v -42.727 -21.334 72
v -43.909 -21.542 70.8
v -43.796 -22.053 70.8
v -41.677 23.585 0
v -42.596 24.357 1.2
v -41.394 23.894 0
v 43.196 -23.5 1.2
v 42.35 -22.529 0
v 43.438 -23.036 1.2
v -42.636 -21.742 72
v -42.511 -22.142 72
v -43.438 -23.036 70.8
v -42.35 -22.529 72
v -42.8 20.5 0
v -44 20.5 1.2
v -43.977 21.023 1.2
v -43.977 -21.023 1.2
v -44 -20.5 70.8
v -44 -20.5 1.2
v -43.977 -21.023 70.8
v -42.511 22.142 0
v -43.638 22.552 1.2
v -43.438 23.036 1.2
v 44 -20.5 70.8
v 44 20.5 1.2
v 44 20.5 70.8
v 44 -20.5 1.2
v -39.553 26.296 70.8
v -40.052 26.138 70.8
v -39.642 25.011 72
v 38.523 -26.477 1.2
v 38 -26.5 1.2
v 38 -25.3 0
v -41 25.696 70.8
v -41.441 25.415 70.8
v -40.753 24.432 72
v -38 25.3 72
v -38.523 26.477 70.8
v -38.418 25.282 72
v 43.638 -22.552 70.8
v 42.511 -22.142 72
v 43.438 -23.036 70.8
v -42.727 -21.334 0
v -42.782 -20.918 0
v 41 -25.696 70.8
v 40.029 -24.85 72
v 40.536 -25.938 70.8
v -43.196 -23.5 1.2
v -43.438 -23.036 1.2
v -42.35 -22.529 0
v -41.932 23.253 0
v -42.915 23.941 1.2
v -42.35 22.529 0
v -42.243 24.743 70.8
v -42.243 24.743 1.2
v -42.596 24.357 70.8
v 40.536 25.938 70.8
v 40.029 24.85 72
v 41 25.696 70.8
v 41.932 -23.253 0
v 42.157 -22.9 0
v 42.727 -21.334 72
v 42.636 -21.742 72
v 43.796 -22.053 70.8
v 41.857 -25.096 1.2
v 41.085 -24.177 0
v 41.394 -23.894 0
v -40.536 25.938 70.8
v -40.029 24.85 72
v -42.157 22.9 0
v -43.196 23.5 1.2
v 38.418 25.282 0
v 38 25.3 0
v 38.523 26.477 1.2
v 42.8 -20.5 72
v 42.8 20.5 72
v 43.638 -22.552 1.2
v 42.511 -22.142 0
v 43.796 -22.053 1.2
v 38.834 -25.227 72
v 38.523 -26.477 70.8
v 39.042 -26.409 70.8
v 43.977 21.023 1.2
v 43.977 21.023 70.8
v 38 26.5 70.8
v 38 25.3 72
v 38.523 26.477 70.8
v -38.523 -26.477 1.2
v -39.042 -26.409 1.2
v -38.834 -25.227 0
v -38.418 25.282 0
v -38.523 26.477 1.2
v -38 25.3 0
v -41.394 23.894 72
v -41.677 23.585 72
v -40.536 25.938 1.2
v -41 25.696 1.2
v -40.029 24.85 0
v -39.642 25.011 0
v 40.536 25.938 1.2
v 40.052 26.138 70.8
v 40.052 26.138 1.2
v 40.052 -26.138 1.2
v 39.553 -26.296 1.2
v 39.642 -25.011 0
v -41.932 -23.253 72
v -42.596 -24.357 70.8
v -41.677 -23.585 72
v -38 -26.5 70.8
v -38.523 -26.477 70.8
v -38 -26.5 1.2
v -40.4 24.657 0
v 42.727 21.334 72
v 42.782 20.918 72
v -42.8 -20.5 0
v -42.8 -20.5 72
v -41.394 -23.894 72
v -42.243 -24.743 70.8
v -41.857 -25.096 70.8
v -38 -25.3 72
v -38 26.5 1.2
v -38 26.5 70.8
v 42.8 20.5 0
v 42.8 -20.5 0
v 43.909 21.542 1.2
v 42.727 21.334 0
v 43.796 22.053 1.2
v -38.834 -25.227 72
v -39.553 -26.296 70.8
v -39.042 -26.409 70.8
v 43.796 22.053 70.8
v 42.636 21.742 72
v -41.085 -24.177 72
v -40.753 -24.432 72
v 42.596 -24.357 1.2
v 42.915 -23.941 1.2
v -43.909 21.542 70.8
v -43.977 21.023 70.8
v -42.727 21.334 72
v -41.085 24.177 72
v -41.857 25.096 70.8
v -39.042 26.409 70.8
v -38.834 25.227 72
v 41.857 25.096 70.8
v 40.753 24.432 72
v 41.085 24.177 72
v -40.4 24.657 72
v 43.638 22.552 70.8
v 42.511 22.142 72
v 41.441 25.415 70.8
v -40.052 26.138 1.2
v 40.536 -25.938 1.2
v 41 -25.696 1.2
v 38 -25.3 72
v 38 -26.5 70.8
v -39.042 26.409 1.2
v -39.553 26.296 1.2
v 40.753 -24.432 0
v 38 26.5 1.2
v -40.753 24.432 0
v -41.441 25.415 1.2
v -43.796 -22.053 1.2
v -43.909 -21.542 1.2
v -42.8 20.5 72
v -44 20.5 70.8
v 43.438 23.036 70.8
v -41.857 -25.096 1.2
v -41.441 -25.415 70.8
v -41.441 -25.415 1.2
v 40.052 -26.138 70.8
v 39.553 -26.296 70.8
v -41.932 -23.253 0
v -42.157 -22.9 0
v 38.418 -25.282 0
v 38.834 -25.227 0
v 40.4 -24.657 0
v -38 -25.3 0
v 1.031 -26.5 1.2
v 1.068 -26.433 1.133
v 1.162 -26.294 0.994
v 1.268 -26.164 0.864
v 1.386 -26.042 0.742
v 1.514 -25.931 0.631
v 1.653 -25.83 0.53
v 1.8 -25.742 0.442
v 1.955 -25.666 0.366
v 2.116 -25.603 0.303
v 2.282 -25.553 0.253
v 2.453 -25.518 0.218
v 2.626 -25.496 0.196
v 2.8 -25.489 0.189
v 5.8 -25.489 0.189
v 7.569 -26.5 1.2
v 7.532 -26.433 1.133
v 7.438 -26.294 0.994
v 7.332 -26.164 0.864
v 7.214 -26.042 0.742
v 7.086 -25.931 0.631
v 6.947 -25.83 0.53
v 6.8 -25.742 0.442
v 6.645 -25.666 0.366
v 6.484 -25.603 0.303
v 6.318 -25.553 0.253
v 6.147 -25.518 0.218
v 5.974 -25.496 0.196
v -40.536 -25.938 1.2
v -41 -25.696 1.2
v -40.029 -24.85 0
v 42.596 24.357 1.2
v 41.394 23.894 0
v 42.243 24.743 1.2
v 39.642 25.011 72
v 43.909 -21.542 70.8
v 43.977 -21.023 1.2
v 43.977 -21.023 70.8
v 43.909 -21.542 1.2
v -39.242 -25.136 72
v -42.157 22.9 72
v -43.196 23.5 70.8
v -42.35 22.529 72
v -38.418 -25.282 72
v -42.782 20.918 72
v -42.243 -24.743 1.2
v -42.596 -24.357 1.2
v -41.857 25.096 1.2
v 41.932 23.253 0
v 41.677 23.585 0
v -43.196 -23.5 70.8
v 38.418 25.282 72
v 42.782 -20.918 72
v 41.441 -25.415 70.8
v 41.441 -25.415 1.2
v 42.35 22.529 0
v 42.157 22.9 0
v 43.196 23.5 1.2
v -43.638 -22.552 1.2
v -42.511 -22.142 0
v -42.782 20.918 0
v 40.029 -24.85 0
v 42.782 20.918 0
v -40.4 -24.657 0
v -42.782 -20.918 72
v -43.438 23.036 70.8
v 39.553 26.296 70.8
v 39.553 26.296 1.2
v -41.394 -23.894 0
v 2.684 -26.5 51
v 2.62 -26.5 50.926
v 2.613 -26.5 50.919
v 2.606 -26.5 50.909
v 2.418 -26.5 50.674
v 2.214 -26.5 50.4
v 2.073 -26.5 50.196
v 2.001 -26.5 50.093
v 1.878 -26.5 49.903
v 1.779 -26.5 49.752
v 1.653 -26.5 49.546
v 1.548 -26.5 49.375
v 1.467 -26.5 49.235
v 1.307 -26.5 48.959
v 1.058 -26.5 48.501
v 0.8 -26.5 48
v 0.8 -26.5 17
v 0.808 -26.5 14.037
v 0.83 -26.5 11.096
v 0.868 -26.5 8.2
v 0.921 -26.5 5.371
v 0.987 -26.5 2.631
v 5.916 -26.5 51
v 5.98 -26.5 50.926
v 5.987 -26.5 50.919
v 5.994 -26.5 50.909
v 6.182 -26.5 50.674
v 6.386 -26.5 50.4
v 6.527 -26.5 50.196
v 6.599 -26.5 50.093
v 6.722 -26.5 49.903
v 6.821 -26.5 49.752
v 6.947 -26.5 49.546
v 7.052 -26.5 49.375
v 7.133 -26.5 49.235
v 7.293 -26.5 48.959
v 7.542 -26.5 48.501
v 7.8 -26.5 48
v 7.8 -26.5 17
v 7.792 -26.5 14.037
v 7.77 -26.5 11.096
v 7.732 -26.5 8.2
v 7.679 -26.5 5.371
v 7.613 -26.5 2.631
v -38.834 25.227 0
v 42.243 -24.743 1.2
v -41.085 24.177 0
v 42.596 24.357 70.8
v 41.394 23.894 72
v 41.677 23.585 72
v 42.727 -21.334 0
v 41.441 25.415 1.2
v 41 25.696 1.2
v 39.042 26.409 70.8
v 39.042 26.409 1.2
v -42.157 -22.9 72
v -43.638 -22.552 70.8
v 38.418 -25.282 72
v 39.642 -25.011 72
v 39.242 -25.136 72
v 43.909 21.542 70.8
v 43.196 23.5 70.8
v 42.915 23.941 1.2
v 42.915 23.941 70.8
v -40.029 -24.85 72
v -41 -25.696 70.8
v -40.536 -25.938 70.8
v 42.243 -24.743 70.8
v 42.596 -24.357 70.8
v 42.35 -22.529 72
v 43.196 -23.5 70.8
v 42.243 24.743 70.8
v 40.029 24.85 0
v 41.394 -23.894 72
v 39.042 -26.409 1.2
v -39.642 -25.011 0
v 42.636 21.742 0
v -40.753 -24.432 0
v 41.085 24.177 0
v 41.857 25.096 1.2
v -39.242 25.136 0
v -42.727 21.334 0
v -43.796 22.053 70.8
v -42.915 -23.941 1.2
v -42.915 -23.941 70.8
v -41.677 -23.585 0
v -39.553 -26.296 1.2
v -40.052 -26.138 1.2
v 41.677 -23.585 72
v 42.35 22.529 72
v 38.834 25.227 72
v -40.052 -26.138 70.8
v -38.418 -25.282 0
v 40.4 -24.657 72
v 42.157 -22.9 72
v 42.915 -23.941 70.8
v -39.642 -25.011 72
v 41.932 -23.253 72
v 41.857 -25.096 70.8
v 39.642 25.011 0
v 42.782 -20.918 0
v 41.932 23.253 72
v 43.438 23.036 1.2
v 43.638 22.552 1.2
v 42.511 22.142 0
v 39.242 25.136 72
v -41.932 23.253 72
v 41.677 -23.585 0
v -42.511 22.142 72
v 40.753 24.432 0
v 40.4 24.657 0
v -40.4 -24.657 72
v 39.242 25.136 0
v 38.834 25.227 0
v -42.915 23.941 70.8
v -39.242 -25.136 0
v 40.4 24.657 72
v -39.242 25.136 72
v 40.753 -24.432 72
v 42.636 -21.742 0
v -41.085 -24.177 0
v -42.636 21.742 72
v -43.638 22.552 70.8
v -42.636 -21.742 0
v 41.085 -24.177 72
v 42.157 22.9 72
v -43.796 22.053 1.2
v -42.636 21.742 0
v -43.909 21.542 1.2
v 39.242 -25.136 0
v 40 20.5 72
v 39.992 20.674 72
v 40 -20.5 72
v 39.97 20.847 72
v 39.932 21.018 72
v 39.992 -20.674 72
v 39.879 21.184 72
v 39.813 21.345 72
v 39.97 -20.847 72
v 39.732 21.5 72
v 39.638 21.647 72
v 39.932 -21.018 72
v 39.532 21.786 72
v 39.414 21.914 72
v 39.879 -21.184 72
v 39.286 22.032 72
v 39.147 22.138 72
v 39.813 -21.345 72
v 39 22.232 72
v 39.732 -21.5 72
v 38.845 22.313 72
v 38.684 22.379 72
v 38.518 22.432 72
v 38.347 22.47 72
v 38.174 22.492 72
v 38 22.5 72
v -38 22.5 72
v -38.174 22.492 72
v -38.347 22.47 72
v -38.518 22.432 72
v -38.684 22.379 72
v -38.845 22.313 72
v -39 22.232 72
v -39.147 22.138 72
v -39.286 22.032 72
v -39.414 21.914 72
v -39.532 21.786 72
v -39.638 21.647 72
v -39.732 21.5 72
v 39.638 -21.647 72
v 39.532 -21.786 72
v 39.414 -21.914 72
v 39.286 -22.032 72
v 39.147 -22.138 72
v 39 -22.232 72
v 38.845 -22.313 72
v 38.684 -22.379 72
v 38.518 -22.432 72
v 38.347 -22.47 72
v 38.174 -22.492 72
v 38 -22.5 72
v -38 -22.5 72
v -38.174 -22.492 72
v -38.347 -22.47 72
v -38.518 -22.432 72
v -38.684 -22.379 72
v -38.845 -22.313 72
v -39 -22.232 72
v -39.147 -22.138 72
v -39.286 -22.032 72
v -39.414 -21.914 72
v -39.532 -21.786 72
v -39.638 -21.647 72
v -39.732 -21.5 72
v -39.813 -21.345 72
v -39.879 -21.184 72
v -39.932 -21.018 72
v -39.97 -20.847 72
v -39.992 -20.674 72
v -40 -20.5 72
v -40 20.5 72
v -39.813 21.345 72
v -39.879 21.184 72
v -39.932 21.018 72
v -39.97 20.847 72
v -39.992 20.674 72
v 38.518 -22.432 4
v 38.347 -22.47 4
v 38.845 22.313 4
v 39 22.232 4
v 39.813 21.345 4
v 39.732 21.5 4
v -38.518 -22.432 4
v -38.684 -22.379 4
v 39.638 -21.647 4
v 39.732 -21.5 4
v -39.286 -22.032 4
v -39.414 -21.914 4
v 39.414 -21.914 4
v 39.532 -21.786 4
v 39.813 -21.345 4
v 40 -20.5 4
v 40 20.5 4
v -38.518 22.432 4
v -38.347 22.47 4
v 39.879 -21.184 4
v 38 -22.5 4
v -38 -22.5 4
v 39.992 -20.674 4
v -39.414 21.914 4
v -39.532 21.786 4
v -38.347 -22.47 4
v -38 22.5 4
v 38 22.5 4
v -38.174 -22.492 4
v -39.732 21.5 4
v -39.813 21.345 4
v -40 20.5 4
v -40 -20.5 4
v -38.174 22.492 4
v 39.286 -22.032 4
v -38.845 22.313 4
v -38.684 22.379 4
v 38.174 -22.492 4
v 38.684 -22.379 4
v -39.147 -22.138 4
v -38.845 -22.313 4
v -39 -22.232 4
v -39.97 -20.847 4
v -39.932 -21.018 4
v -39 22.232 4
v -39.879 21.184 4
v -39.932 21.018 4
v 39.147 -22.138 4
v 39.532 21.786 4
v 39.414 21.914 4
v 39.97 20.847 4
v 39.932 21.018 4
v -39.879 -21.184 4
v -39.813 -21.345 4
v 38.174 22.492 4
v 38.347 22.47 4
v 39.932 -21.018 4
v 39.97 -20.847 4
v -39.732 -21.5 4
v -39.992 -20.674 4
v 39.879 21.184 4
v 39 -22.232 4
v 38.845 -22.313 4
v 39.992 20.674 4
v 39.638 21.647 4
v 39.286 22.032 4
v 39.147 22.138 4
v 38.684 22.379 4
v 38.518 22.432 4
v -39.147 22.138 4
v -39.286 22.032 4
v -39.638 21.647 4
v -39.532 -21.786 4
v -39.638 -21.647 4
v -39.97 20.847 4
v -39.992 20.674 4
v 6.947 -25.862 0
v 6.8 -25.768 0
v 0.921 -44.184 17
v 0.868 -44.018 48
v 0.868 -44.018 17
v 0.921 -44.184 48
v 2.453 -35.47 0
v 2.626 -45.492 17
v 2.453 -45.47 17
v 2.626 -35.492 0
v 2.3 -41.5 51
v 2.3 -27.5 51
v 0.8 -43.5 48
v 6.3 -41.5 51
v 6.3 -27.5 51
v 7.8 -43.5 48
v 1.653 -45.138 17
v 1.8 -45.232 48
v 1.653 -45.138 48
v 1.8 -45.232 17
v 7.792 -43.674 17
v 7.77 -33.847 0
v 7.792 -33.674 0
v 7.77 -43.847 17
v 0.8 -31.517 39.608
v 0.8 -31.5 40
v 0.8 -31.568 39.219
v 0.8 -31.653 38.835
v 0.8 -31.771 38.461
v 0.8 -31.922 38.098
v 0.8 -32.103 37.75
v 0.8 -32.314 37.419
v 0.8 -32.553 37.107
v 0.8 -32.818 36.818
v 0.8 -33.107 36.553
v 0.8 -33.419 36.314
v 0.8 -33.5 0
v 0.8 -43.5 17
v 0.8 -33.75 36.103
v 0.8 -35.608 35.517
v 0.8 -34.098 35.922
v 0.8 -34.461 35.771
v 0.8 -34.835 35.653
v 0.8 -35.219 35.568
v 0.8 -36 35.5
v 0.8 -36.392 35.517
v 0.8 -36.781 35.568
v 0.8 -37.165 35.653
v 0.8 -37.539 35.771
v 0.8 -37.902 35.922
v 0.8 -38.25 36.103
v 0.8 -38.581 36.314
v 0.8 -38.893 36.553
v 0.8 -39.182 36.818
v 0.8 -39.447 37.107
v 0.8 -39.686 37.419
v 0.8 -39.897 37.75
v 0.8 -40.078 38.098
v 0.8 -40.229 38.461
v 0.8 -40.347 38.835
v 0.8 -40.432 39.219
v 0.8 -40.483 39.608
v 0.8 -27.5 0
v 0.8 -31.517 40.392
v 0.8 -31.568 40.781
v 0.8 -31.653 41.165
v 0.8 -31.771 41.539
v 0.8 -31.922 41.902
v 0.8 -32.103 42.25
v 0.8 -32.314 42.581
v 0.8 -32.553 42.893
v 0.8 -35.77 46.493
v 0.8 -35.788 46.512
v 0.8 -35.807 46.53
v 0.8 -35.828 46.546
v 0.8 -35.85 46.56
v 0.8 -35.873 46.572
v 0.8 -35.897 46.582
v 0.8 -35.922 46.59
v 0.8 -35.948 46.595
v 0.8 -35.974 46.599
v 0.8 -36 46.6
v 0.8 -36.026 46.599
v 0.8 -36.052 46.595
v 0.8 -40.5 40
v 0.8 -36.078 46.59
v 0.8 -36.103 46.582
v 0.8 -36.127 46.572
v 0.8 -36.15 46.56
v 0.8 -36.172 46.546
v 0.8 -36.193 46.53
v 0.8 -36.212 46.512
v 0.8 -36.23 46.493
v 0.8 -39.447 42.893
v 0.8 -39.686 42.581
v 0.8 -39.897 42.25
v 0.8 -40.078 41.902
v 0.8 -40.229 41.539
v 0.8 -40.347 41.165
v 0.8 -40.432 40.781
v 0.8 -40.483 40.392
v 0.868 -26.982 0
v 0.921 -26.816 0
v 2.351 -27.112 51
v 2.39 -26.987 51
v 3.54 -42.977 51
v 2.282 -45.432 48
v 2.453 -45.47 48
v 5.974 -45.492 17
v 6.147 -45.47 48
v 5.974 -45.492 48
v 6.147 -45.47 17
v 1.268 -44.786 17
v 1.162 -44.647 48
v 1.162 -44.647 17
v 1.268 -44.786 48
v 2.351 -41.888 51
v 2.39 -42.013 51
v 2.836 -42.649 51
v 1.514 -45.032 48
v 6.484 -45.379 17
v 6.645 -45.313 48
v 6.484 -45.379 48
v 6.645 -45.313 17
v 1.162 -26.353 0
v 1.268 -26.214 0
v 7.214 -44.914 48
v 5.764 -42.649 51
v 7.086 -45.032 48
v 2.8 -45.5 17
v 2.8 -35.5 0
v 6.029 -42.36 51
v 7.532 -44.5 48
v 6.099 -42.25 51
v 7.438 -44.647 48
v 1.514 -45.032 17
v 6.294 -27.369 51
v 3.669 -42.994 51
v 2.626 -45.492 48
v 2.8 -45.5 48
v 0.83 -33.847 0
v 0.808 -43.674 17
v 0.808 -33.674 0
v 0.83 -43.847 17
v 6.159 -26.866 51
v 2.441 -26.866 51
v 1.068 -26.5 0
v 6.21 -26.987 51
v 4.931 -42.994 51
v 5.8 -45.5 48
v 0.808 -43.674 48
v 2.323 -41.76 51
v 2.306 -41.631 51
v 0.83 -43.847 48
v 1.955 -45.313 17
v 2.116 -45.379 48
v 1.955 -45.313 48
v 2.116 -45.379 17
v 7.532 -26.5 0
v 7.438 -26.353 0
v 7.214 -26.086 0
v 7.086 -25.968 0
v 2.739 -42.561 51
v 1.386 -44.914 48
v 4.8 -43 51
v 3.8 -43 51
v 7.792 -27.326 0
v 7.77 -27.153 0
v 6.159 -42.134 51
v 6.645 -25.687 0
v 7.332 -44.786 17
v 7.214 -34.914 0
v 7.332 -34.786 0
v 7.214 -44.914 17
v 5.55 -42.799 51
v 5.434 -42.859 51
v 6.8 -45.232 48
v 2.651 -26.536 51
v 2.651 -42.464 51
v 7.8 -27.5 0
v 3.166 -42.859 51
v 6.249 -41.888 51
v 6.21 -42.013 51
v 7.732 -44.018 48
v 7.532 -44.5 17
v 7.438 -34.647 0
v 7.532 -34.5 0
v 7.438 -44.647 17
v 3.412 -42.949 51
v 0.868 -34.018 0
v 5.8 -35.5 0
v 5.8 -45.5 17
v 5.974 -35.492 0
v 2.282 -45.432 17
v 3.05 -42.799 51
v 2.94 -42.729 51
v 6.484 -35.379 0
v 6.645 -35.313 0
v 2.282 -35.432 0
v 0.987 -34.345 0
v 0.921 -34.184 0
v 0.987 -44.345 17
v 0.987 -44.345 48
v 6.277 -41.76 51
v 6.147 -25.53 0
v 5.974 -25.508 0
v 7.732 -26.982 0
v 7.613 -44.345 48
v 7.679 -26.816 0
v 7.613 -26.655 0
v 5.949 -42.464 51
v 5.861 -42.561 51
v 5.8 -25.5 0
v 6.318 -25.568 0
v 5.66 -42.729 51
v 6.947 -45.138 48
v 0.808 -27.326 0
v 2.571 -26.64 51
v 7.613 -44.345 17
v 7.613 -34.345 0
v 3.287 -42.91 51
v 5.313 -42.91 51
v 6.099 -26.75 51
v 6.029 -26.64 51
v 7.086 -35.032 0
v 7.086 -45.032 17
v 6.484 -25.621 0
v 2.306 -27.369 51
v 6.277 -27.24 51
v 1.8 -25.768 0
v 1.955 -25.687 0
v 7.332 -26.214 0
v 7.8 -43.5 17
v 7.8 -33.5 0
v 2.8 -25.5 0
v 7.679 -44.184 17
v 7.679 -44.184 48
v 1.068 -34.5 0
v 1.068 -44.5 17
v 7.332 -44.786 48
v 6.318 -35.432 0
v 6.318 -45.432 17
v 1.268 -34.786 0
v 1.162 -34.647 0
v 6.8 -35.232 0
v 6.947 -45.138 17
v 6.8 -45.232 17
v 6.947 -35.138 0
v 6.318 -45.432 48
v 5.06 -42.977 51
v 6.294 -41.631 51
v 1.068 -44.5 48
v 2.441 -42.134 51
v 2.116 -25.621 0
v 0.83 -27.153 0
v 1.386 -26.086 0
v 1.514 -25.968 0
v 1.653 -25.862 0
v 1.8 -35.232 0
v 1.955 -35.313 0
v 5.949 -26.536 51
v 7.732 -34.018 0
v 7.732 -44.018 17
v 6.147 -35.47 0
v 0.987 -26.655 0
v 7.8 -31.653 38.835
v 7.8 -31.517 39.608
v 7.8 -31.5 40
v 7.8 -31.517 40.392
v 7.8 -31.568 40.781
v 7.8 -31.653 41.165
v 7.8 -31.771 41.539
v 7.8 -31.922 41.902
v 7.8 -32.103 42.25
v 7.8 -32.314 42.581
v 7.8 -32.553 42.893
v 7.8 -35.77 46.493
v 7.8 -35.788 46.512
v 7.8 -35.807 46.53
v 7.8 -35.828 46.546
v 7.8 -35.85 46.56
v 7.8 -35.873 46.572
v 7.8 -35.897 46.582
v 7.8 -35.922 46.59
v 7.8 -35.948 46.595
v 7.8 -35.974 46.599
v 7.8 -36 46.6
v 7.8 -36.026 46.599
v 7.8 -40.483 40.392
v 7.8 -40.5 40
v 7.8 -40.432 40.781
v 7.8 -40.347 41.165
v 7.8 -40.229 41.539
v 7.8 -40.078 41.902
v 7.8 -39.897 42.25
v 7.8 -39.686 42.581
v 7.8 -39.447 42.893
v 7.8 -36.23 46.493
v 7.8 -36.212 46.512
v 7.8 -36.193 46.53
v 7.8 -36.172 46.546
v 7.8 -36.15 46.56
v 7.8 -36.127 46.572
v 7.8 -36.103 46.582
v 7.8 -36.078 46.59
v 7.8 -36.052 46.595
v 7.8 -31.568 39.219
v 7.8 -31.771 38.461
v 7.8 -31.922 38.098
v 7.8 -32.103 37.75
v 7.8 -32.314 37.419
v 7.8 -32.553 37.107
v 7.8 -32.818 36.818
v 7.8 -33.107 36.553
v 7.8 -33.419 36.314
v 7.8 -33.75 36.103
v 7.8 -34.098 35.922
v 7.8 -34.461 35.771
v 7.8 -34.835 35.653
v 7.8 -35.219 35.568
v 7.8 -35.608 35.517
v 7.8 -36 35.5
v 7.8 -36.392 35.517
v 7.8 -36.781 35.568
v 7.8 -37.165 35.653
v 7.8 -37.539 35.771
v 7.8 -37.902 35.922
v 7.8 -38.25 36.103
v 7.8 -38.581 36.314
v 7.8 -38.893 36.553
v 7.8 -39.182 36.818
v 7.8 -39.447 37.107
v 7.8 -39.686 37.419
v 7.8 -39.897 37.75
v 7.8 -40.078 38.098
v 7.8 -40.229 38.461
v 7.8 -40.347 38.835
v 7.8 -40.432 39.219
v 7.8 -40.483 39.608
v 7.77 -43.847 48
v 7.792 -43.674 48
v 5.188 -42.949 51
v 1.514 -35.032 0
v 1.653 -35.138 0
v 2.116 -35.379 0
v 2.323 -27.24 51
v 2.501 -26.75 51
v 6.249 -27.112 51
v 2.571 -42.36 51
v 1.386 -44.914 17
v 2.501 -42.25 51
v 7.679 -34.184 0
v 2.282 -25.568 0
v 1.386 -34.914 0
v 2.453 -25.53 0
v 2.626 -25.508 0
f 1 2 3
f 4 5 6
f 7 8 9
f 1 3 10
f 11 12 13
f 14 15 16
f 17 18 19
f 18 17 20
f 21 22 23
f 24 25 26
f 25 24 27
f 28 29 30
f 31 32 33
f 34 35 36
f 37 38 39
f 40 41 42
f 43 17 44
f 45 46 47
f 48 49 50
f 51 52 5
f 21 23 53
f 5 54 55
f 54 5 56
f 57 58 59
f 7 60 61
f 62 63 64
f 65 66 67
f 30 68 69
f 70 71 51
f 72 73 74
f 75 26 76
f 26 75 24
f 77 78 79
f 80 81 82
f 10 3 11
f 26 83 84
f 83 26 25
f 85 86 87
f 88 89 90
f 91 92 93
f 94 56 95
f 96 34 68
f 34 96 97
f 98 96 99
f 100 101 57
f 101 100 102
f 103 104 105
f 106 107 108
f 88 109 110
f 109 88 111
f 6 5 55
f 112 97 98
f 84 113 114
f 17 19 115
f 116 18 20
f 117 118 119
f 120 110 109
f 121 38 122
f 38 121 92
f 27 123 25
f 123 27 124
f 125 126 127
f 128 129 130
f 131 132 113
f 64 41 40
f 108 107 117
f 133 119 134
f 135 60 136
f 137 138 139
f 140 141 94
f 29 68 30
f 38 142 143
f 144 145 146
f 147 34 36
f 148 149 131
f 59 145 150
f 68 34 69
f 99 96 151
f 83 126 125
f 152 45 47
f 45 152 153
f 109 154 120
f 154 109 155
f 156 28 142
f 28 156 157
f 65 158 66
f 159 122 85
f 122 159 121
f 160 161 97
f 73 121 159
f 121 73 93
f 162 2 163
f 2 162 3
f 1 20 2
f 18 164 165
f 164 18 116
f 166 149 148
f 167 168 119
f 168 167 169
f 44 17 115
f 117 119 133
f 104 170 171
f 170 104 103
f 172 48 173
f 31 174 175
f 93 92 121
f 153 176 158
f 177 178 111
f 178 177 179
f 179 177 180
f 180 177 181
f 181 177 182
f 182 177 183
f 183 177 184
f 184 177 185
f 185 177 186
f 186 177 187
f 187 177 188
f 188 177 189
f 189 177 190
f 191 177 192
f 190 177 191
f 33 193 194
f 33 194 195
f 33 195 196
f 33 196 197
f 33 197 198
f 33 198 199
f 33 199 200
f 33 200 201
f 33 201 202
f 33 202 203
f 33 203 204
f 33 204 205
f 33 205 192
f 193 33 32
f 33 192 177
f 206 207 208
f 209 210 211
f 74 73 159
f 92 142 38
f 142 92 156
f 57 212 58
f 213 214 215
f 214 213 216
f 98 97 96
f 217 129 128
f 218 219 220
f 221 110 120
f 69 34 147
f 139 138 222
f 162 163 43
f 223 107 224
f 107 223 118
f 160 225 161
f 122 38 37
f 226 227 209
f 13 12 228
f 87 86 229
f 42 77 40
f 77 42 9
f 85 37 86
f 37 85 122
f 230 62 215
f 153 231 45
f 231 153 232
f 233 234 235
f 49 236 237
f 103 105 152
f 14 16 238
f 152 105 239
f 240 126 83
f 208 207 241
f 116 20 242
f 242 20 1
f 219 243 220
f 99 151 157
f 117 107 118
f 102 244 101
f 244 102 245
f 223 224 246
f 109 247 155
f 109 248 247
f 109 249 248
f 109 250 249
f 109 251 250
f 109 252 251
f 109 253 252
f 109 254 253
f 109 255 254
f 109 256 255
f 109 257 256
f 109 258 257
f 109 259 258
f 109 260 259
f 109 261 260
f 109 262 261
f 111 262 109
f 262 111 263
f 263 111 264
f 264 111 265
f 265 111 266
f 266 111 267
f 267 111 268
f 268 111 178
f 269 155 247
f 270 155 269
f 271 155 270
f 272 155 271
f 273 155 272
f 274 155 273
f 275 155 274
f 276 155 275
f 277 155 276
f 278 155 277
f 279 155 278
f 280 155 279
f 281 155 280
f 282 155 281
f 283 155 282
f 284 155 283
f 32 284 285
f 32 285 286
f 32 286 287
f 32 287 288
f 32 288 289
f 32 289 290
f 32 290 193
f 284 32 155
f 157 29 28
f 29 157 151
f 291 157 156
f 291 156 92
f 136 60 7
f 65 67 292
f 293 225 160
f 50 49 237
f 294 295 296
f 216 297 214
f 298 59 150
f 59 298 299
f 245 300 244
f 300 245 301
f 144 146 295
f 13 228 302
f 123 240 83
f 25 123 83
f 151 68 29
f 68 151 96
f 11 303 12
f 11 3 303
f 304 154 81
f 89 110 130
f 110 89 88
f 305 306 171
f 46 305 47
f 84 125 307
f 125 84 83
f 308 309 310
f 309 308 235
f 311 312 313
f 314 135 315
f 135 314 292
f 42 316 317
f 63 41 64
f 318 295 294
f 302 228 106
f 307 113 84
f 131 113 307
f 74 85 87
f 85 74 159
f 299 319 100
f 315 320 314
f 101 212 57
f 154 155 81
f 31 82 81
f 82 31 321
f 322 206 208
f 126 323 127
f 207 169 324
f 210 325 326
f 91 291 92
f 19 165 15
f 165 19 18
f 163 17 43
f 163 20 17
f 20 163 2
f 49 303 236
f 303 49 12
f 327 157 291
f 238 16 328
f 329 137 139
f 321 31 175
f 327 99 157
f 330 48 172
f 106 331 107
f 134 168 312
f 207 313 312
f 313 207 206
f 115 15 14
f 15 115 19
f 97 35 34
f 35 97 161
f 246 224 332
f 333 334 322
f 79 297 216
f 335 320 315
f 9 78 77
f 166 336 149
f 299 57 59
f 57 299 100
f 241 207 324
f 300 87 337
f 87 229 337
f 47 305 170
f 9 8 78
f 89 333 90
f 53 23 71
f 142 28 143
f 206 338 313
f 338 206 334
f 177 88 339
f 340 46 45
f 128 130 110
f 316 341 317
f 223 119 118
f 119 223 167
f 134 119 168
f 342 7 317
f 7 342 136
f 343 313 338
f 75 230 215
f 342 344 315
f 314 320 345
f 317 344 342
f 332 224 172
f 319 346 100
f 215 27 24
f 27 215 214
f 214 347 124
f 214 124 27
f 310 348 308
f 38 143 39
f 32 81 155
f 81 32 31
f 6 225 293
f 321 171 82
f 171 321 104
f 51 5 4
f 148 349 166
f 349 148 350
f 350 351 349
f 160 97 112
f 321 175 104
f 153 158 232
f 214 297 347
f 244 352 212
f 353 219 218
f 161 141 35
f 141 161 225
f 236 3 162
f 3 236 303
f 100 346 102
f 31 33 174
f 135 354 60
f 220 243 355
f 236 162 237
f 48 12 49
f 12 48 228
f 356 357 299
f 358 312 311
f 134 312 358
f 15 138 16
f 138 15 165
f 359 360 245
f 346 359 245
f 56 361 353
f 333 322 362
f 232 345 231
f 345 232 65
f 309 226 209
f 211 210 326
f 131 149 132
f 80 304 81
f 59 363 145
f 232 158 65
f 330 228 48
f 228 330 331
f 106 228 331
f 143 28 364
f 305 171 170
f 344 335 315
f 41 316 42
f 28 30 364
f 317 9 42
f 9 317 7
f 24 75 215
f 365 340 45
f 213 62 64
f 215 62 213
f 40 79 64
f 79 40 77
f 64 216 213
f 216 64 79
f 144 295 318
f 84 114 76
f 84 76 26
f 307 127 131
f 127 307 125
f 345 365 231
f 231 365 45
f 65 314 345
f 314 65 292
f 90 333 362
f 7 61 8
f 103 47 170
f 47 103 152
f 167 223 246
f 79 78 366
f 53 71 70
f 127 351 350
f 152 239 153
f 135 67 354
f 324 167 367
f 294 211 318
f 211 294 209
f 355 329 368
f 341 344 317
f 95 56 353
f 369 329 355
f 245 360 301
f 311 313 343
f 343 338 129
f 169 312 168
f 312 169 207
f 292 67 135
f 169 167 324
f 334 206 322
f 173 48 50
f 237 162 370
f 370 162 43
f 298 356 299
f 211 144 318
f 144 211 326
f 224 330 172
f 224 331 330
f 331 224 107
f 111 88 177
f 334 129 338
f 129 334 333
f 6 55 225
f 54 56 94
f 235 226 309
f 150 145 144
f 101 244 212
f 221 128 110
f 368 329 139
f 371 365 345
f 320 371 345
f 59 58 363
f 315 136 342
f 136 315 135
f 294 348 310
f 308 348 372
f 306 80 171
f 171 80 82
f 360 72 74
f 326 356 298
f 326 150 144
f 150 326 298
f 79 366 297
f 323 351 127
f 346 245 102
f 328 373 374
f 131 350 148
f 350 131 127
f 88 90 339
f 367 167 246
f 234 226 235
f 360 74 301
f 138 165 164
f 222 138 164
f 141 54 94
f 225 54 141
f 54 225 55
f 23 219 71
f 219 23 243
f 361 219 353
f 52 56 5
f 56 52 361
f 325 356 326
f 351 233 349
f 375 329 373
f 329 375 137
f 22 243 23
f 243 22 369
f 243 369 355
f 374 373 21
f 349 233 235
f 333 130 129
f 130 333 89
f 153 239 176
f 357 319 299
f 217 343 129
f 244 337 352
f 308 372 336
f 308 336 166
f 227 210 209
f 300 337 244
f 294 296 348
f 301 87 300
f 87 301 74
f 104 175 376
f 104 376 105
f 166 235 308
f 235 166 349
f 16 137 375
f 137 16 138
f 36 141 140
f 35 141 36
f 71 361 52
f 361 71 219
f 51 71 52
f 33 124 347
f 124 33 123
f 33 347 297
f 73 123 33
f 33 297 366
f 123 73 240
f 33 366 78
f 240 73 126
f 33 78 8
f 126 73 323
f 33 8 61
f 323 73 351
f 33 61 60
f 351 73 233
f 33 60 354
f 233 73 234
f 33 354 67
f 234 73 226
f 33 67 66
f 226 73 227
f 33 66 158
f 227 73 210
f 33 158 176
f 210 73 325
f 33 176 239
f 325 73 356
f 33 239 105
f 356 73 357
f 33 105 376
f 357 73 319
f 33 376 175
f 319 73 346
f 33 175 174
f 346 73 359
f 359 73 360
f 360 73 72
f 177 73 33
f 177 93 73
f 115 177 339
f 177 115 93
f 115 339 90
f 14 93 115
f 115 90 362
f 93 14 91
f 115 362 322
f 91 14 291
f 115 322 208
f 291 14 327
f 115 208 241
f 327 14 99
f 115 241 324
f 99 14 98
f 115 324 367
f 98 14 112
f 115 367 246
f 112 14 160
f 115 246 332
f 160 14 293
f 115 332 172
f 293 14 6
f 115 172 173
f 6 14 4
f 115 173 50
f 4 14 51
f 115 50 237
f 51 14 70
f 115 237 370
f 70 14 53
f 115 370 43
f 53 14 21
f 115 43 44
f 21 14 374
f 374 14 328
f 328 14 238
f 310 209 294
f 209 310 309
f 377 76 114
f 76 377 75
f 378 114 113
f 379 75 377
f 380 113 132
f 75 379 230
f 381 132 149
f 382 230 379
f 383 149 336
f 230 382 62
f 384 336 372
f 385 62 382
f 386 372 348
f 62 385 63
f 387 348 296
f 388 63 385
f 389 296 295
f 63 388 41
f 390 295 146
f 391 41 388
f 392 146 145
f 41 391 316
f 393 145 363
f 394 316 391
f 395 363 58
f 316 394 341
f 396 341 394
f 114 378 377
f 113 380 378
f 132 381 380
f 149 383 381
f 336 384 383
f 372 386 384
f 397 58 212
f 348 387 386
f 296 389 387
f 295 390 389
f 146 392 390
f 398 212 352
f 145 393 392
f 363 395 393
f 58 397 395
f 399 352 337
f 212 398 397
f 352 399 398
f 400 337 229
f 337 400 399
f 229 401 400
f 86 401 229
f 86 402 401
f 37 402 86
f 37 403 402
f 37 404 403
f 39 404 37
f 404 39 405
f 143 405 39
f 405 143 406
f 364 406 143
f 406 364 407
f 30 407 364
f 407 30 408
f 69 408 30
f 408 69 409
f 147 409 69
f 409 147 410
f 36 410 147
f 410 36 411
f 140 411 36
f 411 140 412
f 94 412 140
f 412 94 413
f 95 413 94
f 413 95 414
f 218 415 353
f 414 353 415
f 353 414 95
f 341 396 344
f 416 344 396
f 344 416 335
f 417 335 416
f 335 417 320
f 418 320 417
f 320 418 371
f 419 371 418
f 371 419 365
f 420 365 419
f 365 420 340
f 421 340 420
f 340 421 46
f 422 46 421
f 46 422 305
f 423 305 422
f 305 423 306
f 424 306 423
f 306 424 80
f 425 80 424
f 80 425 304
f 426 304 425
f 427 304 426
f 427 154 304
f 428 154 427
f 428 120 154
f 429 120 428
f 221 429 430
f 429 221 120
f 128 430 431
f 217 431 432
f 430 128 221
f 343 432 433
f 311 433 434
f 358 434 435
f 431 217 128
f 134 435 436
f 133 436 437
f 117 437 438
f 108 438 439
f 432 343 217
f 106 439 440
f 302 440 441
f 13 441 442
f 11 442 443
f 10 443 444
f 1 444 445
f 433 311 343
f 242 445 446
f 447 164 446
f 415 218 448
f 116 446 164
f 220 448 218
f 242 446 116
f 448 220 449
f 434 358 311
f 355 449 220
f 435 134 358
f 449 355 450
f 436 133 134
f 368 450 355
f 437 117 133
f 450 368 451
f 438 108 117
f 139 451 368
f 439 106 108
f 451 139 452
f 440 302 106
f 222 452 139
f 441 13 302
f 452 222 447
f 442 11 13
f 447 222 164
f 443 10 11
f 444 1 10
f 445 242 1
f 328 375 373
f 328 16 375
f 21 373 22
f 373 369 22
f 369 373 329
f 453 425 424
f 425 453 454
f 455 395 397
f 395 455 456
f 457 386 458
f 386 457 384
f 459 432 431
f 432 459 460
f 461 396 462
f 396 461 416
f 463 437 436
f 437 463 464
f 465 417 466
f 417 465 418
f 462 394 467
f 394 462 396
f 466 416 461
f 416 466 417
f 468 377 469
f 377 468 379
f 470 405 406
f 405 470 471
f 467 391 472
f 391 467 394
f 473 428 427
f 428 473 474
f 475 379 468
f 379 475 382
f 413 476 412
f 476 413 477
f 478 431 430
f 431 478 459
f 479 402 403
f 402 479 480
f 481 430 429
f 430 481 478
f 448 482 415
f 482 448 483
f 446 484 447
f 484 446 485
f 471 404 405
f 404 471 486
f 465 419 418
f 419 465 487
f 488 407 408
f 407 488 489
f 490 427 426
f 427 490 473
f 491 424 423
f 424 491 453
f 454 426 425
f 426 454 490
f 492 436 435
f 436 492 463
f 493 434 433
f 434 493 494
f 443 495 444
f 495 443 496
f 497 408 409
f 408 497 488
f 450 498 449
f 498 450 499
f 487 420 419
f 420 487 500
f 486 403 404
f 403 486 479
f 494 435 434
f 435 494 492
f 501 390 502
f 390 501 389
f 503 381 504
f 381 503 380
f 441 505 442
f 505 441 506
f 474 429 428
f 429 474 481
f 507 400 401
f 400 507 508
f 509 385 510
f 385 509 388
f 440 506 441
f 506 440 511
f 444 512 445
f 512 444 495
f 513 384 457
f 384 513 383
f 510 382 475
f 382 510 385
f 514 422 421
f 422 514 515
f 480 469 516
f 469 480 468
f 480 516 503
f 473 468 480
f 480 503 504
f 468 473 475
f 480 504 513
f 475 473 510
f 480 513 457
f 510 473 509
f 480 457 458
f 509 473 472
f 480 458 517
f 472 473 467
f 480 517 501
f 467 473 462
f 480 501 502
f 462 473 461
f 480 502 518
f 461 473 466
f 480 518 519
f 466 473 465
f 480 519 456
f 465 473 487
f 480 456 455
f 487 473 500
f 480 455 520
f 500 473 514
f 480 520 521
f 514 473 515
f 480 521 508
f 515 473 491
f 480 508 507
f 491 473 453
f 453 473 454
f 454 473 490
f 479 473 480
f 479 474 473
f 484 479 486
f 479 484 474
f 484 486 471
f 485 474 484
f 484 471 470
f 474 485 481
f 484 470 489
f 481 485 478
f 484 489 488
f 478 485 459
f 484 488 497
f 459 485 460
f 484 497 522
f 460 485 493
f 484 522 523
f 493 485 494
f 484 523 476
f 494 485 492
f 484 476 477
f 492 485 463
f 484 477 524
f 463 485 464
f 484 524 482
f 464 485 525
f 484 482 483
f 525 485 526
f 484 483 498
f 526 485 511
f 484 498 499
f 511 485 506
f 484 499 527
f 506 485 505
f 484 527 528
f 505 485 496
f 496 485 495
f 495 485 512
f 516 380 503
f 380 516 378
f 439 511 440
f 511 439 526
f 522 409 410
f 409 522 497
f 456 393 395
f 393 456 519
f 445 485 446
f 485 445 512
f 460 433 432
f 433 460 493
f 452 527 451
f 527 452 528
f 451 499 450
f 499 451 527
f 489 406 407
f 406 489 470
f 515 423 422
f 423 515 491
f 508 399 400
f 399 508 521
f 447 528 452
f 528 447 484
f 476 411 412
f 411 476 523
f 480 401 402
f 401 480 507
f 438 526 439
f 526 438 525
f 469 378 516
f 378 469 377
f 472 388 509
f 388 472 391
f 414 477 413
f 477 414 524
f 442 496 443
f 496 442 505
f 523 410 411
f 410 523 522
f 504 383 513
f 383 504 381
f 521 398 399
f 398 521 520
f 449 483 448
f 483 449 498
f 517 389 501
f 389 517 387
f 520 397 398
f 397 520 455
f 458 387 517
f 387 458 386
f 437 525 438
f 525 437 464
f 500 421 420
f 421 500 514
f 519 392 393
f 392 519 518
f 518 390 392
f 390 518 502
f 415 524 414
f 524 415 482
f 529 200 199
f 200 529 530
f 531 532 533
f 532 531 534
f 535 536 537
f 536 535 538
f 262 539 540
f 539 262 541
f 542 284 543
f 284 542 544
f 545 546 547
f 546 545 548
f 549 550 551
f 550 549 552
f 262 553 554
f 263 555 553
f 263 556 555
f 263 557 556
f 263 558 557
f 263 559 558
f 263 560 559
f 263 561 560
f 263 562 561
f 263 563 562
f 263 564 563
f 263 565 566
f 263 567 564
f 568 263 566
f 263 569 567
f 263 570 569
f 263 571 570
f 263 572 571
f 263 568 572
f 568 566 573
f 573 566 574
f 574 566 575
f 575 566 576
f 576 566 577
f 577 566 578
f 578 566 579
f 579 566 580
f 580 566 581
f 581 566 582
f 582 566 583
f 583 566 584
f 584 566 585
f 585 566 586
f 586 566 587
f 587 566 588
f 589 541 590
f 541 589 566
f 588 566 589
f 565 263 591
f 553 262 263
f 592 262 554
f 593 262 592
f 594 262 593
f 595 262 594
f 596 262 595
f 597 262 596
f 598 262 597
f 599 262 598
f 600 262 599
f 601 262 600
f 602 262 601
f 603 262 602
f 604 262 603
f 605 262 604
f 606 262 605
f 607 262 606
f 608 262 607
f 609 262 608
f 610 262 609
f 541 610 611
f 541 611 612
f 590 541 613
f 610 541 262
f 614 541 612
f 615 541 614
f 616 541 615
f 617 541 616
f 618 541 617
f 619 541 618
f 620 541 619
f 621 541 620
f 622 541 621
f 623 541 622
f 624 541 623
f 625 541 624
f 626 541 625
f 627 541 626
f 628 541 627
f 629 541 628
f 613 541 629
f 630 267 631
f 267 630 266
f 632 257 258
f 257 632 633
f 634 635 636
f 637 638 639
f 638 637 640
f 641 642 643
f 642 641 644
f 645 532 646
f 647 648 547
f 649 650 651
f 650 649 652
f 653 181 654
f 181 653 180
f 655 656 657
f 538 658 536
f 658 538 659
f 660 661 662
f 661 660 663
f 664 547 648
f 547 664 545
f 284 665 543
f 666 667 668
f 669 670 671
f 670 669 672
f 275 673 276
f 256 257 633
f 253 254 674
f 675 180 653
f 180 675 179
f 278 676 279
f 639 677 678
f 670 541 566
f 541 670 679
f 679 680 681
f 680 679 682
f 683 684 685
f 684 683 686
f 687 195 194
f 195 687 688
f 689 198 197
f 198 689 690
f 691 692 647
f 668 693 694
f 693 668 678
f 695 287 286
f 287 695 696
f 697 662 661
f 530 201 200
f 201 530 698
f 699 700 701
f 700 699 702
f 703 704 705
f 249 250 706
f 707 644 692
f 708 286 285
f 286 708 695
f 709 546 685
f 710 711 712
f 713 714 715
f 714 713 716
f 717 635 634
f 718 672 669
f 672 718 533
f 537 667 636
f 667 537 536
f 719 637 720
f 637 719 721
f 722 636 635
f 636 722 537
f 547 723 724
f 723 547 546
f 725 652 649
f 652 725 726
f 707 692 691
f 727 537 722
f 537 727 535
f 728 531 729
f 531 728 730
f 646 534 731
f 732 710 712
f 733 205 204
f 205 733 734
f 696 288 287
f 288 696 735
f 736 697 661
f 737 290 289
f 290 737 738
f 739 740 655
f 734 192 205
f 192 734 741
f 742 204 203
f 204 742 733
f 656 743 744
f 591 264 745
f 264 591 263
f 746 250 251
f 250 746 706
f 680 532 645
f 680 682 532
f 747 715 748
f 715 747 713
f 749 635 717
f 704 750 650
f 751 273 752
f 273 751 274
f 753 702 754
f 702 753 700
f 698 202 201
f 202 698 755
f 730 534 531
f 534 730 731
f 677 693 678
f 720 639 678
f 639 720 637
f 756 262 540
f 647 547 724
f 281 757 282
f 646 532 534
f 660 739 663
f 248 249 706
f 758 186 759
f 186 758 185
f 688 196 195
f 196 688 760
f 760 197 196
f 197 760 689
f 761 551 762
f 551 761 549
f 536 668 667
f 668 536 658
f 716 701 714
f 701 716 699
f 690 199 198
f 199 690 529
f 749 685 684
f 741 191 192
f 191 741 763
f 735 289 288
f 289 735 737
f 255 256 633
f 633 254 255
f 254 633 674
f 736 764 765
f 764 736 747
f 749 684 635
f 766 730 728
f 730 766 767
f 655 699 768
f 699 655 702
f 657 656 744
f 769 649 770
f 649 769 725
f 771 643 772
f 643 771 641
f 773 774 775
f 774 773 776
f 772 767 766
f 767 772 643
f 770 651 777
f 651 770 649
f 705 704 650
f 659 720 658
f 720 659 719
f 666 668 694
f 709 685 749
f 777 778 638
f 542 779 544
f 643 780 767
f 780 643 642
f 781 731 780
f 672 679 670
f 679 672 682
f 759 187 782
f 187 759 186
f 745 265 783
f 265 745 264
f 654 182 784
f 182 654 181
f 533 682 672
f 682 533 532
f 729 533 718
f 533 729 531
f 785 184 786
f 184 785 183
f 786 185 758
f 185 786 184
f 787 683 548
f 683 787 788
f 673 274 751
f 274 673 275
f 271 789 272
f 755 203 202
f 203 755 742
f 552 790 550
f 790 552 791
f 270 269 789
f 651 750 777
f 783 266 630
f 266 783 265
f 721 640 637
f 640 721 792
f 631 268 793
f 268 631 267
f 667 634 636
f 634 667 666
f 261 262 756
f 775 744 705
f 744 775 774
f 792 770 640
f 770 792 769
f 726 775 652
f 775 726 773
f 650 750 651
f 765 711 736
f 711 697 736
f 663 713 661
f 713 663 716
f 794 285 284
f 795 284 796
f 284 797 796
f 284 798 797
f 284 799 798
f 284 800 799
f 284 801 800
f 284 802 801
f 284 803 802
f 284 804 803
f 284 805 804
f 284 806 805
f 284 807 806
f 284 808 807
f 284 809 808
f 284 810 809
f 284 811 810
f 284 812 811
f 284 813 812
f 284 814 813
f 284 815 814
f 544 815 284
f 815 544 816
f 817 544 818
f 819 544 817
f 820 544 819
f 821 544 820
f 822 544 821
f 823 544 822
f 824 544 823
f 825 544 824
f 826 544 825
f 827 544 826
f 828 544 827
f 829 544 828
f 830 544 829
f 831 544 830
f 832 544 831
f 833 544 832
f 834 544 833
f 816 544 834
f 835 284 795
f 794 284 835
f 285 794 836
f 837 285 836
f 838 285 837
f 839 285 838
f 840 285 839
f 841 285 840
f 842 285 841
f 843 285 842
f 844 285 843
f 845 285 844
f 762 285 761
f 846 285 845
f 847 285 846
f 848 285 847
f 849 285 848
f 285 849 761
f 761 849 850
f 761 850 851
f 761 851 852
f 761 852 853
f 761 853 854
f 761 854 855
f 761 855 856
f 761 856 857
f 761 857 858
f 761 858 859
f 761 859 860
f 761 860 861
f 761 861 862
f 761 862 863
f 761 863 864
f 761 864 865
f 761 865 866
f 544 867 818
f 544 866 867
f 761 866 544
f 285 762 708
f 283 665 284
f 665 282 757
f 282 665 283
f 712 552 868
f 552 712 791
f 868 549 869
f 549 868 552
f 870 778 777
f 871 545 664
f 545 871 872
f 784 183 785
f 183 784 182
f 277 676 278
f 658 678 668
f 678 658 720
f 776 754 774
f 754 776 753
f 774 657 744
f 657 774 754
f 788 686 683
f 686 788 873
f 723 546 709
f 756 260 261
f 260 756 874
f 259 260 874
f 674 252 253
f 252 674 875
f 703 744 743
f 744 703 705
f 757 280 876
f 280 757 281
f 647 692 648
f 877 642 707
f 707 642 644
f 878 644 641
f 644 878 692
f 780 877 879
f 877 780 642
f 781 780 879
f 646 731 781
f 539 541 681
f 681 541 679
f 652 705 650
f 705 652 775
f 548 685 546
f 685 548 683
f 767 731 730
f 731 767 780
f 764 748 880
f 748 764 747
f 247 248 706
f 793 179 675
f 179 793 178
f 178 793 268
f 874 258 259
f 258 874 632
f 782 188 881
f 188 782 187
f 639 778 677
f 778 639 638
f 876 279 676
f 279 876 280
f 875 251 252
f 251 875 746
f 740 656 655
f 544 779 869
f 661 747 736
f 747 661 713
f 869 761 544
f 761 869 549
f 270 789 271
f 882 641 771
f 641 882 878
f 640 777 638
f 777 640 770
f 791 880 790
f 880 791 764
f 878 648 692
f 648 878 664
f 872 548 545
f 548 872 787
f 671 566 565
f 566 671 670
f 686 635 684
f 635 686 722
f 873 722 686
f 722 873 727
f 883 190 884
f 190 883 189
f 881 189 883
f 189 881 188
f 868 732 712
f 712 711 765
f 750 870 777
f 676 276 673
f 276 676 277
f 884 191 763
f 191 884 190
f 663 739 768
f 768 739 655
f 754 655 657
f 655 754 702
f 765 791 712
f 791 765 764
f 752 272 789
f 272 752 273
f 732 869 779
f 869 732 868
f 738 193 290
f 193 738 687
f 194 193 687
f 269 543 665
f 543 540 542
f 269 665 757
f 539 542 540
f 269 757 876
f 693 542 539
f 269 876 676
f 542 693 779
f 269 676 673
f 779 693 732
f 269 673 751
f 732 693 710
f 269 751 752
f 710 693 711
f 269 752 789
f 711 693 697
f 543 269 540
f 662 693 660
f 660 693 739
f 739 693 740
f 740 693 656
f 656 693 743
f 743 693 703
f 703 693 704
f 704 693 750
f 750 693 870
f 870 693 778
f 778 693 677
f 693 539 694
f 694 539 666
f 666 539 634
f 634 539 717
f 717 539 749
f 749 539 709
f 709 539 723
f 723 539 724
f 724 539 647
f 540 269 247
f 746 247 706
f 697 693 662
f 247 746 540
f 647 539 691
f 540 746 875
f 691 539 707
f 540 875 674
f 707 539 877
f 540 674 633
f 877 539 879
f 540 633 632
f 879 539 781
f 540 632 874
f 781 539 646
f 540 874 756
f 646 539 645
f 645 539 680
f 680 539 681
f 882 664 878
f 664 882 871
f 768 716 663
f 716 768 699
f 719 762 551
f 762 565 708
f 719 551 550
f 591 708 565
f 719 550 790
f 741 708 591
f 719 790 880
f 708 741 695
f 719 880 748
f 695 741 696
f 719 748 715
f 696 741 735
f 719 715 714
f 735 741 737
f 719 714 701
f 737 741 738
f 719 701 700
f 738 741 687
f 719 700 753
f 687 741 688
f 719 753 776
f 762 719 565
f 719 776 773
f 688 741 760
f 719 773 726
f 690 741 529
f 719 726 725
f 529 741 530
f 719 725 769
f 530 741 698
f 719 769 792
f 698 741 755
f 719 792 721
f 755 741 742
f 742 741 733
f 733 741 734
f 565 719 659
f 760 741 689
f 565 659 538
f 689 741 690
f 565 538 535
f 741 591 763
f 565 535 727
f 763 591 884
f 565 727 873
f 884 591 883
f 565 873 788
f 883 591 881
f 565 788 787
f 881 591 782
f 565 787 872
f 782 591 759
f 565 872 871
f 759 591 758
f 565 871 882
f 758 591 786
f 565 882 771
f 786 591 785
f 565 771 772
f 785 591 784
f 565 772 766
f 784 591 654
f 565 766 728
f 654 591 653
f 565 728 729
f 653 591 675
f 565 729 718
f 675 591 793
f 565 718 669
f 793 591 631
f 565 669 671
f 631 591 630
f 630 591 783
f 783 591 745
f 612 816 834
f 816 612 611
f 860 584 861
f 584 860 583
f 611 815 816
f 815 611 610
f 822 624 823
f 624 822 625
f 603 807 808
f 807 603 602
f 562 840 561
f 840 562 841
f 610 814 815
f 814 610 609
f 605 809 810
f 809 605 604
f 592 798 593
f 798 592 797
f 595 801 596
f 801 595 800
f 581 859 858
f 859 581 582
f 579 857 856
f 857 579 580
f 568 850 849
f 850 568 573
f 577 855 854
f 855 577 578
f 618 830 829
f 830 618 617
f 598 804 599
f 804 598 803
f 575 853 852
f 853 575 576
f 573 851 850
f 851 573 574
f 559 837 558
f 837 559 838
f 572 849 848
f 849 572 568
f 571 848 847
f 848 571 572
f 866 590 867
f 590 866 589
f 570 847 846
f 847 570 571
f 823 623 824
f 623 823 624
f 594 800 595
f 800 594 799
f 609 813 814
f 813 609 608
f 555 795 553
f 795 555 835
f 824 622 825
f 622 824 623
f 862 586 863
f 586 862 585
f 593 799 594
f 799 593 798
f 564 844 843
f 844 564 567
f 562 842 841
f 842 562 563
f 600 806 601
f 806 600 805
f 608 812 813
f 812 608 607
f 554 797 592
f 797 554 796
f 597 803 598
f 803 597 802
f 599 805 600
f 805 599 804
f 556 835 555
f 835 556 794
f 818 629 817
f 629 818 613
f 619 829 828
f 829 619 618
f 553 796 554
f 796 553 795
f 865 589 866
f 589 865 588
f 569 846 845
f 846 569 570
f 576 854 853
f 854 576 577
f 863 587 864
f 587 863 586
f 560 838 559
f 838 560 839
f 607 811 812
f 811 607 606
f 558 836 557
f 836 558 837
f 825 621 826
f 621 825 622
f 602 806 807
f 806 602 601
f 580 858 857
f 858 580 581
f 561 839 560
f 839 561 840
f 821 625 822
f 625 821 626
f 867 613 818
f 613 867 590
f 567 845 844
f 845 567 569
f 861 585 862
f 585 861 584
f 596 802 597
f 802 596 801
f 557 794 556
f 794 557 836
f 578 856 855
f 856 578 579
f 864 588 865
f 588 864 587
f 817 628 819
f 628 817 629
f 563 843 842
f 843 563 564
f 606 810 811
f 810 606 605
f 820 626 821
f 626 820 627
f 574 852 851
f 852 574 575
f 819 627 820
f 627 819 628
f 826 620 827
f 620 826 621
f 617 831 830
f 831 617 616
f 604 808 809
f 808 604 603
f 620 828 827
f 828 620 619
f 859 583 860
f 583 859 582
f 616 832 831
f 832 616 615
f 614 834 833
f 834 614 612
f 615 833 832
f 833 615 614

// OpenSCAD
// =====================================================================
//  Schluesselsafe zur Selbstdisziplinierung  -  v3
//  ------------------------------------------------------------------
//  Zwei Druckteile, kein Zubehoer ausser einem Vorhaengeschloss.
//
//  Verriegelung als echte Ueberfalle: je eine Lasche am Kasten und am
//  Deckel stehen NEBENEINANDER an der Vorderseite, die Loecher fluchten.
//  Der Schlossbuegel liegt damit auf Scherung zwischen beiden Laschen -
//  das Schloss haengt frei vor dem Kasten, nichts liegt auf dem Deckel.
//
//  Hebelschutz:
//   * Deckel greift 20 mm aussen ueber den Kasten UND 6 mm innen hinein
//     (Labyrinthfuge - kein gerader Weg nach innen, kein Verkanten)
//   * Restspiel beim Anheben < 1 mm, es entsteht also gar kein Spalt
//   * Verriegelung sitzt tief unten an der Front: langer Hebelarm gegen
//     Aufkippen des Deckels
//   * Deckel hat keinerlei Oeffnung - nichts, wo ein Draht hineinpasst
//   * Untere Schuerzenkante angefast, damit kein Werkzeug untergreift
//
//  Passung (v3): der Deckel traegt nur auf sechs schmalen Fuehrungsrippen,
//  dazwischen und an allen vier Ecken ist die Tasche freigestellt. Die
//  Gleitflaeche sinkt damit von rund 3900 auf unter 500 mm^2 - genau das
//  war der Grund, warum v2 beim festen Zudruecken nicht mehr aufging.
//
//  Alle Masse in mm.
//     openscad -D teil=\"kasten\" -o kasten.stl schluesselsafe.scad
//     openscad -D teil=\"deckel\" -o deckel.stl schluesselsafe.scad
// =====================================================================

/* [Was soll erzeugt werden] */
teil     = "beides";   // "kasten", "deckel", "beides" (Vorschau) oder "keins"
variante = "gross";    // "gross" (hoher Kasten) oder "kompakt" (flache Kassette)

k = (variante == "kompakt");

/* [Innenmasse des Stauraums] */
innen_b = 80;               // Breite (X) - Autoschluessel mit Fernbedienung passt laengs
innen_t = k ? 38 : 45;      // Tiefe  (Y)
innen_h = k ? 32 : 68;      // Hoehe  (Z) - gross: so hoch, dass das Schloss frei haengt

// --- Passung ---------------------------------------------------------
// v2 hatte die Schuerze auf ganzer Flaeche am Kasten anliegen: knapp
// 4000 mm^2 parallele Gleitflaeche. Bei 0,5 mm Nennspiel genuegt dann
// EINE lokale Abweichung - Wandverzug, Ueberextrusion, ein zu dicker
// Eckradius - und der Deckel presst sich fest. Mehr Spiel hilft dagegen
// nicht (es verschiebt nur die Schwelle) und kostet Hebelschutz.
// v3 traegt deshalb nur noch auf sechs schmalen Fuehrungsrippen; alles
// andere, insbesondere die vier Ecken, ist freigestellt.
spiel         = 0.5;            // Spiel an den Rippen - das ist die Passung
relief        = 0.8;            // Freistellung dazwischen (Spalt dort: spiel+relief)
rippe_b       = 6;              // Breite einer Fuehrungsrippe
spiel_lippe   = 1.6;            // Innenlippe: reine Labyrinthsperre, beruehrt nie.
                                // v2 hatte 0,9 - zu wenig, wenn die lange Kastenwand
                                // beim Drucken nach innen zieht. Dann klemmte die
                                // Lippe genau am Ende des Wegs.
einfuehr      = 1.2;            // Einfuehrschraege an Kastenrand und Schuerzenmaul

/* [Materialstaerken] */
wand          = k ? 3.5 : 4;
boden         = k ? 3.5 : 4;
deckel_dicke  = k ? 4   : 5;
schuerze_h    = k ? 13  : 20;   // Ueberlappung aussen (Hebelschutz)
schuerze_wand = (k ? 2.5 : 3) + relief;  // die Freistellung darf die
                                         // Schuerze nicht duenner machen
lippe_h       = k ? 5   : 6;    // Eingriff der Innenlippe (Labyrinthfuge)
lippe_wand    = k ? 2.2 : 2.5;
eckradius     = k ? 5   : 6;
fase          = k ? 1.0 : 1.2;


/* [Ueberfalle / Vorhaengeschloss] */
lasche_b      = k ? 5   : 7;    // Dicke je Lasche (X)
lasche_spalt  = k ? 1.0 : 1.6;  // Luft dazwischen -> noetige lichte Buegelweite
lasche_t      = k ? 16  : 19;   // wie weit die Laschen nach vorn stehen (Y)
buegel_d      = k ? 8   : 9;    // Bohrung fuer den Buegel (max. Buegel-Ø minus 1)
lasche_rand   = k ? 8   : 11;   // Material ueber/unter dem Loch
lasche_luft   = 1;              // Luft zwischen Kastenlasche und Schuerzenunterkante

/* [Optionen] */
wandmontage   = false; // Schraubloecher in der Rueckwand (nur von innen zugaenglich)
schraube_d    = 5;
senkung_d     = 10;
drainage      = false; // Wasserabzugsloecher im Boden (Aussenbereich)
drainage_d    = 4;

$fn = 72;

// ---------------------------------------------------------------- Ableitungen
aussen_b  = innen_b + 2*wand;
aussen_t  = innen_t + 2*wand;
aussen_h  = innen_h + boden;
innen_r   = max(eckradius - wand, 0.8);

deckel_b  = aussen_b + 2*(spiel + schuerze_wand);
deckel_t  = aussen_t + 2*(spiel + schuerze_wand);
deckel_r  = eckradius + spiel + schuerze_wand;
deckel_ok = aussen_h + deckel_dicke;     // Oberkante geschlossen
fuge_z    = aussen_h - schuerze_h;       // Unterkante Schuerze = sichtbare Fuge

front_y   = -aussen_t/2;                 // Aussenflaeche der Vorderwand
lasche_y  = front_y - lasche_t/2;        // Mitte der Laschen in Y
loch_y    = front_y - lasche_t/2;        // Lochmitte in Y
kasten_lasche_x =  (lasche_spalt + lasche_b)/2;   // rechts
deckel_lasche_x = -(lasche_spalt + lasche_b)/2;   // links
// Die Ueberfalle sitzt so hoch wie moeglich: direkt unter der Fuge.
// Dadurch haengt das Vorhaengeschloss frei vor der Wand statt unter dem Boden.
lasche_ok = fuge_z - lasche_luft;        // Oberkante Kastenlasche
loch_z    = lasche_ok - lasche_rand;     // Hoehe der Lochmitte
lasche_uk = loch_z - lasche_rand;        // Unterkante Deckellasche
// Ab hier laeuft die Deckellasche keilfoermig in die Schuerze aus. Beim
// kompakten Kasten frueher, sonst wird der Keil steiler als 45 Grad.
lasche_voll_ok = k ? loch_z + 5 : fuge_z;

// ---------------------------------------------------------------- Hilfsmodule

// Quader mit gerundeten senkrechten Kanten, in X/Y zentriert
module rbox(b, t, h, r) {
    linear_extrude(height = h)
        offset(r = r) square([max(b - 2*r, 0.01), max(t - 2*r, 0.01)], center = true);
}

// Quader mit umlaufender Fase unten (fu) und oben (fo)
module rbox_fase(b, t, h, r, fu = 0, fo = 0) {
    hull() {
        if (fu > 0) rbox(b - 2*fu, t - 2*fu, 0.01, max(r - fu, 0.01));
        translate([0, 0, fu]) rbox(b, t, h - fu - fo, r);
        if (fo > 0) translate([0, 0, h - 0.01]) rbox(b - 2*fo, t - 2*fo, 0.01, max(r - fo, 0.01));
    }
}

// Waagerechtes Loch mit 45-Grad-Dach (Tropfenform) - druckt ohne Stuetze.
// richtung = +1: Spitze nach oben (Teil steht),  -1: nach unten (Teil liegt auf dem Ruecken)
module tropfenloch(d, laenge, richtung = 1) {
    rotate([0, 90, 0])
        linear_extrude(height = laenge, center = true)
            hull() {
                circle(d = d);
                // Spitze so weit weg, dass die Tangenten unter 45 Grad bleiben
                translate([-richtung * d * 0.7, 0]) circle(d = 0.6);   // Vorzeichen: rotate([0,90,0]) dreht 2D-x auf -z
            }
}

// ---------------------------------------------------------------- Kasten

// Kastenlasche: unten schlank, ab Lochhoehe volle Tiefe, oben angefast.
// Die Anbindung an die Wand geht ueber die volle Hoehe bis in den Boden.
module kasten_lasche() {
    translate([kasten_lasche_x, 0, 0]) hull() {
        translate([0, front_y - 4, 0])                 rbox(lasche_b, 10, 2, 2);
        translate([0, lasche_y + 1, lasche_rand + 6])  rbox(lasche_b, lasche_t + 2, lasche_ok - lasche_rand - 9, 2);
        translate([0, lasche_y + 1.5, lasche_ok - 0.01]) rbox(lasche_b - 3, lasche_t - 2, 0.01, 1.5);
    }
}

module montageloecher() {
    for (p = [[-25, aussen_h - 12], [25, aussen_h - 12], [0, 14]])
        translate([p[0], 0, p[1]]) {
            translate([0, aussen_t/2 - wand/2, 0]) rotate([0,0,90]) tropfenloch(schraube_d, wand + 4);
            translate([0, aussen_t/2 - wand, 0]) rotate([-90, 0, 0])
                cylinder(h = wand + 0.01, d1 = senkung_d, d2 = schraube_d);
        }
}

module drainageloecher() {
    for (x = [-innen_b/4, innen_b/4], y = [-innen_t/4, innen_t/4])
        translate([x, y, -1]) cylinder(h = boden + 2, d = drainage_d);
}

module kasten() {
    difference() {
        union() {
            difference() {
                rbox_fase(aussen_b, aussen_t, aussen_h, eckradius, fase, einfuehr);
                translate([0, 0, boden]) rbox(innen_b, innen_t, innen_h + 1, innen_r);
            }
            kasten_lasche();
        }
        translate([kasten_lasche_x, loch_y, loch_z])
            tropfenloch(buegel_d, lasche_b + 6, +1);
        if (wandmontage) montageloecher();
        if (drainage)    drainageloecher();
    }
}

// Freistellung der Schuerzentasche: ein umlaufendes Band, das die Tasche um
// "relief" aufweitet - ausgenommen sechs Rippenfelder (zwei je Laengswand,
// eins je Schmalwand). Die Rippen liegen bewusst auf den geraden Flaechen und
// klar neben den Ecken: die Ecken sind beim Druck am unmassgenauesten und
// tragen jetzt gar nicht mehr. Die untersten 1,5 mm der Tasche bleiben
// umlaufend eng, das ist das Fangband am Schuerzenmaul.
module freistellung() {
    rip_x = aussen_b/2 - eckradius - rippe_b/2 - 2.5;   // Rippenmitte, Laengswand
    z0    = fuge_z + einfuehr + 1.5;
    translate([0, 0, z0]) linear_extrude(height = aussen_h - z0 + 1) difference() {
        offset(r = eckradius + spiel + relief)
            square([aussen_b - 2*eckradius, aussen_t - 2*eckradius], center = true);
        offset(r = eckradius + spiel)
            square([aussen_b - 2*eckradius, aussen_t - 2*eckradius], center = true);
        for (x = [-rip_x, rip_x], sy = [-1, 1])          // Laengswaende
            translate([x, sy*(aussen_t/2 + spiel + relief/2)])
                square([rippe_b, relief + 2], center = true);
        for (sx = [-1, 1])                                // Schmalwaende
            translate([sx*(aussen_b/2 + spiel + relief/2), 0])
                square([relief + 2, rippe_b], center = true);
    }
}

// ---------------------------------------------------------------- Deckel

module deckel_lasche() {
    hull() {
        // volle Tiefe unten (dort sitzt das Loch)
        translate([deckel_lasche_x, front_y - spiel - lasche_t/2, lasche_uk])
            rbox(lasche_b, lasche_t, lasche_voll_ok - lasche_uk, 2);
        // laeuft nach oben flach in die Schuerze aus (ca. 36 Grad -> stuetzenfrei)
        translate([deckel_lasche_x, front_y - spiel - schuerze_wand/2, deckel_ok - 6])
            rbox(lasche_b, schuerze_wand, 6, 1);
    }
}

module deckel() {
    difference() {
        union() {
            difference() {
                // Aussenkoerper Schuerze + Platte
                translate([0, 0, fuge_z])
                    rbox_fase(deckel_b, deckel_t, deckel_ok - fuge_z, deckel_r, 1.8, fase);
                // Platz fuer den Kasten, unten mit Einfuehrtrichter
                translate([0, 0, fuge_z + einfuehr])     // exakt bis Kastenoberkante,
                    rbox(aussen_b + 2*spiel, aussen_t + 2*spiel,   // sonst haengt die Lippe frei
                         aussen_h - fuge_z - einfuehr, eckradius + spiel);
                hull() {
                    translate([0, 0, fuge_z - 1.5]) rbox(aussen_b + 2*spiel + 2*einfuehr,
                        aussen_t + 2*spiel + 2*einfuehr, 0.01, eckradius + spiel + einfuehr);
                    translate([0, 0, fuge_z + einfuehr]) rbox(aussen_b + 2*spiel,
                        aussen_t + 2*spiel, 0.01, eckradius + spiel);
                }
            }
            // Innenlippe mit Einfuehrschraege
            difference() {
                hull() {
                    translate([0, 0, aussen_h - lippe_h])
                        rbox(innen_b - 2*spiel_lippe - 1.4, innen_t - 2*spiel_lippe - 1.4, 0.01, innen_r);
                    translate([0, 0, aussen_h - lippe_h + 1.4])
                        rbox(innen_b - 2*spiel_lippe, innen_t - 2*spiel_lippe, lippe_h - 1.4, innen_r);
                }
                translate([0, 0, aussen_h - lippe_h - 1])
                    rbox(innen_b - 2*spiel_lippe - 2*lippe_wand, innen_t - 2*spiel_lippe - 2*lippe_wand,
                         lippe_h + 2, max(innen_r - lippe_wand, 0.8));
            }
            deckel_lasche();
        }
        translate([deckel_lasche_x, loch_y, loch_z])
            tropfenloch(buegel_d, lasche_b + 6, -1);
        freistellung();   // ganz zum Schluss: die Lasche darf nicht hineinragen
    }
}

// Deckel in Drucklage: auf dem Ruecken, Schuerze und Lasche zeigen nach oben
module deckel_druckbar() {
    translate([0, 0, deckel_ok]) rotate([180, 0, 0]) deckel();
}

// ---------------------------------------------------------------- Ausgabe
if      (teil == "kasten") kasten();
else if (teil == "deckel") deckel_druckbar();
else if (teil == "beides") { kasten(); %deckel(); }
